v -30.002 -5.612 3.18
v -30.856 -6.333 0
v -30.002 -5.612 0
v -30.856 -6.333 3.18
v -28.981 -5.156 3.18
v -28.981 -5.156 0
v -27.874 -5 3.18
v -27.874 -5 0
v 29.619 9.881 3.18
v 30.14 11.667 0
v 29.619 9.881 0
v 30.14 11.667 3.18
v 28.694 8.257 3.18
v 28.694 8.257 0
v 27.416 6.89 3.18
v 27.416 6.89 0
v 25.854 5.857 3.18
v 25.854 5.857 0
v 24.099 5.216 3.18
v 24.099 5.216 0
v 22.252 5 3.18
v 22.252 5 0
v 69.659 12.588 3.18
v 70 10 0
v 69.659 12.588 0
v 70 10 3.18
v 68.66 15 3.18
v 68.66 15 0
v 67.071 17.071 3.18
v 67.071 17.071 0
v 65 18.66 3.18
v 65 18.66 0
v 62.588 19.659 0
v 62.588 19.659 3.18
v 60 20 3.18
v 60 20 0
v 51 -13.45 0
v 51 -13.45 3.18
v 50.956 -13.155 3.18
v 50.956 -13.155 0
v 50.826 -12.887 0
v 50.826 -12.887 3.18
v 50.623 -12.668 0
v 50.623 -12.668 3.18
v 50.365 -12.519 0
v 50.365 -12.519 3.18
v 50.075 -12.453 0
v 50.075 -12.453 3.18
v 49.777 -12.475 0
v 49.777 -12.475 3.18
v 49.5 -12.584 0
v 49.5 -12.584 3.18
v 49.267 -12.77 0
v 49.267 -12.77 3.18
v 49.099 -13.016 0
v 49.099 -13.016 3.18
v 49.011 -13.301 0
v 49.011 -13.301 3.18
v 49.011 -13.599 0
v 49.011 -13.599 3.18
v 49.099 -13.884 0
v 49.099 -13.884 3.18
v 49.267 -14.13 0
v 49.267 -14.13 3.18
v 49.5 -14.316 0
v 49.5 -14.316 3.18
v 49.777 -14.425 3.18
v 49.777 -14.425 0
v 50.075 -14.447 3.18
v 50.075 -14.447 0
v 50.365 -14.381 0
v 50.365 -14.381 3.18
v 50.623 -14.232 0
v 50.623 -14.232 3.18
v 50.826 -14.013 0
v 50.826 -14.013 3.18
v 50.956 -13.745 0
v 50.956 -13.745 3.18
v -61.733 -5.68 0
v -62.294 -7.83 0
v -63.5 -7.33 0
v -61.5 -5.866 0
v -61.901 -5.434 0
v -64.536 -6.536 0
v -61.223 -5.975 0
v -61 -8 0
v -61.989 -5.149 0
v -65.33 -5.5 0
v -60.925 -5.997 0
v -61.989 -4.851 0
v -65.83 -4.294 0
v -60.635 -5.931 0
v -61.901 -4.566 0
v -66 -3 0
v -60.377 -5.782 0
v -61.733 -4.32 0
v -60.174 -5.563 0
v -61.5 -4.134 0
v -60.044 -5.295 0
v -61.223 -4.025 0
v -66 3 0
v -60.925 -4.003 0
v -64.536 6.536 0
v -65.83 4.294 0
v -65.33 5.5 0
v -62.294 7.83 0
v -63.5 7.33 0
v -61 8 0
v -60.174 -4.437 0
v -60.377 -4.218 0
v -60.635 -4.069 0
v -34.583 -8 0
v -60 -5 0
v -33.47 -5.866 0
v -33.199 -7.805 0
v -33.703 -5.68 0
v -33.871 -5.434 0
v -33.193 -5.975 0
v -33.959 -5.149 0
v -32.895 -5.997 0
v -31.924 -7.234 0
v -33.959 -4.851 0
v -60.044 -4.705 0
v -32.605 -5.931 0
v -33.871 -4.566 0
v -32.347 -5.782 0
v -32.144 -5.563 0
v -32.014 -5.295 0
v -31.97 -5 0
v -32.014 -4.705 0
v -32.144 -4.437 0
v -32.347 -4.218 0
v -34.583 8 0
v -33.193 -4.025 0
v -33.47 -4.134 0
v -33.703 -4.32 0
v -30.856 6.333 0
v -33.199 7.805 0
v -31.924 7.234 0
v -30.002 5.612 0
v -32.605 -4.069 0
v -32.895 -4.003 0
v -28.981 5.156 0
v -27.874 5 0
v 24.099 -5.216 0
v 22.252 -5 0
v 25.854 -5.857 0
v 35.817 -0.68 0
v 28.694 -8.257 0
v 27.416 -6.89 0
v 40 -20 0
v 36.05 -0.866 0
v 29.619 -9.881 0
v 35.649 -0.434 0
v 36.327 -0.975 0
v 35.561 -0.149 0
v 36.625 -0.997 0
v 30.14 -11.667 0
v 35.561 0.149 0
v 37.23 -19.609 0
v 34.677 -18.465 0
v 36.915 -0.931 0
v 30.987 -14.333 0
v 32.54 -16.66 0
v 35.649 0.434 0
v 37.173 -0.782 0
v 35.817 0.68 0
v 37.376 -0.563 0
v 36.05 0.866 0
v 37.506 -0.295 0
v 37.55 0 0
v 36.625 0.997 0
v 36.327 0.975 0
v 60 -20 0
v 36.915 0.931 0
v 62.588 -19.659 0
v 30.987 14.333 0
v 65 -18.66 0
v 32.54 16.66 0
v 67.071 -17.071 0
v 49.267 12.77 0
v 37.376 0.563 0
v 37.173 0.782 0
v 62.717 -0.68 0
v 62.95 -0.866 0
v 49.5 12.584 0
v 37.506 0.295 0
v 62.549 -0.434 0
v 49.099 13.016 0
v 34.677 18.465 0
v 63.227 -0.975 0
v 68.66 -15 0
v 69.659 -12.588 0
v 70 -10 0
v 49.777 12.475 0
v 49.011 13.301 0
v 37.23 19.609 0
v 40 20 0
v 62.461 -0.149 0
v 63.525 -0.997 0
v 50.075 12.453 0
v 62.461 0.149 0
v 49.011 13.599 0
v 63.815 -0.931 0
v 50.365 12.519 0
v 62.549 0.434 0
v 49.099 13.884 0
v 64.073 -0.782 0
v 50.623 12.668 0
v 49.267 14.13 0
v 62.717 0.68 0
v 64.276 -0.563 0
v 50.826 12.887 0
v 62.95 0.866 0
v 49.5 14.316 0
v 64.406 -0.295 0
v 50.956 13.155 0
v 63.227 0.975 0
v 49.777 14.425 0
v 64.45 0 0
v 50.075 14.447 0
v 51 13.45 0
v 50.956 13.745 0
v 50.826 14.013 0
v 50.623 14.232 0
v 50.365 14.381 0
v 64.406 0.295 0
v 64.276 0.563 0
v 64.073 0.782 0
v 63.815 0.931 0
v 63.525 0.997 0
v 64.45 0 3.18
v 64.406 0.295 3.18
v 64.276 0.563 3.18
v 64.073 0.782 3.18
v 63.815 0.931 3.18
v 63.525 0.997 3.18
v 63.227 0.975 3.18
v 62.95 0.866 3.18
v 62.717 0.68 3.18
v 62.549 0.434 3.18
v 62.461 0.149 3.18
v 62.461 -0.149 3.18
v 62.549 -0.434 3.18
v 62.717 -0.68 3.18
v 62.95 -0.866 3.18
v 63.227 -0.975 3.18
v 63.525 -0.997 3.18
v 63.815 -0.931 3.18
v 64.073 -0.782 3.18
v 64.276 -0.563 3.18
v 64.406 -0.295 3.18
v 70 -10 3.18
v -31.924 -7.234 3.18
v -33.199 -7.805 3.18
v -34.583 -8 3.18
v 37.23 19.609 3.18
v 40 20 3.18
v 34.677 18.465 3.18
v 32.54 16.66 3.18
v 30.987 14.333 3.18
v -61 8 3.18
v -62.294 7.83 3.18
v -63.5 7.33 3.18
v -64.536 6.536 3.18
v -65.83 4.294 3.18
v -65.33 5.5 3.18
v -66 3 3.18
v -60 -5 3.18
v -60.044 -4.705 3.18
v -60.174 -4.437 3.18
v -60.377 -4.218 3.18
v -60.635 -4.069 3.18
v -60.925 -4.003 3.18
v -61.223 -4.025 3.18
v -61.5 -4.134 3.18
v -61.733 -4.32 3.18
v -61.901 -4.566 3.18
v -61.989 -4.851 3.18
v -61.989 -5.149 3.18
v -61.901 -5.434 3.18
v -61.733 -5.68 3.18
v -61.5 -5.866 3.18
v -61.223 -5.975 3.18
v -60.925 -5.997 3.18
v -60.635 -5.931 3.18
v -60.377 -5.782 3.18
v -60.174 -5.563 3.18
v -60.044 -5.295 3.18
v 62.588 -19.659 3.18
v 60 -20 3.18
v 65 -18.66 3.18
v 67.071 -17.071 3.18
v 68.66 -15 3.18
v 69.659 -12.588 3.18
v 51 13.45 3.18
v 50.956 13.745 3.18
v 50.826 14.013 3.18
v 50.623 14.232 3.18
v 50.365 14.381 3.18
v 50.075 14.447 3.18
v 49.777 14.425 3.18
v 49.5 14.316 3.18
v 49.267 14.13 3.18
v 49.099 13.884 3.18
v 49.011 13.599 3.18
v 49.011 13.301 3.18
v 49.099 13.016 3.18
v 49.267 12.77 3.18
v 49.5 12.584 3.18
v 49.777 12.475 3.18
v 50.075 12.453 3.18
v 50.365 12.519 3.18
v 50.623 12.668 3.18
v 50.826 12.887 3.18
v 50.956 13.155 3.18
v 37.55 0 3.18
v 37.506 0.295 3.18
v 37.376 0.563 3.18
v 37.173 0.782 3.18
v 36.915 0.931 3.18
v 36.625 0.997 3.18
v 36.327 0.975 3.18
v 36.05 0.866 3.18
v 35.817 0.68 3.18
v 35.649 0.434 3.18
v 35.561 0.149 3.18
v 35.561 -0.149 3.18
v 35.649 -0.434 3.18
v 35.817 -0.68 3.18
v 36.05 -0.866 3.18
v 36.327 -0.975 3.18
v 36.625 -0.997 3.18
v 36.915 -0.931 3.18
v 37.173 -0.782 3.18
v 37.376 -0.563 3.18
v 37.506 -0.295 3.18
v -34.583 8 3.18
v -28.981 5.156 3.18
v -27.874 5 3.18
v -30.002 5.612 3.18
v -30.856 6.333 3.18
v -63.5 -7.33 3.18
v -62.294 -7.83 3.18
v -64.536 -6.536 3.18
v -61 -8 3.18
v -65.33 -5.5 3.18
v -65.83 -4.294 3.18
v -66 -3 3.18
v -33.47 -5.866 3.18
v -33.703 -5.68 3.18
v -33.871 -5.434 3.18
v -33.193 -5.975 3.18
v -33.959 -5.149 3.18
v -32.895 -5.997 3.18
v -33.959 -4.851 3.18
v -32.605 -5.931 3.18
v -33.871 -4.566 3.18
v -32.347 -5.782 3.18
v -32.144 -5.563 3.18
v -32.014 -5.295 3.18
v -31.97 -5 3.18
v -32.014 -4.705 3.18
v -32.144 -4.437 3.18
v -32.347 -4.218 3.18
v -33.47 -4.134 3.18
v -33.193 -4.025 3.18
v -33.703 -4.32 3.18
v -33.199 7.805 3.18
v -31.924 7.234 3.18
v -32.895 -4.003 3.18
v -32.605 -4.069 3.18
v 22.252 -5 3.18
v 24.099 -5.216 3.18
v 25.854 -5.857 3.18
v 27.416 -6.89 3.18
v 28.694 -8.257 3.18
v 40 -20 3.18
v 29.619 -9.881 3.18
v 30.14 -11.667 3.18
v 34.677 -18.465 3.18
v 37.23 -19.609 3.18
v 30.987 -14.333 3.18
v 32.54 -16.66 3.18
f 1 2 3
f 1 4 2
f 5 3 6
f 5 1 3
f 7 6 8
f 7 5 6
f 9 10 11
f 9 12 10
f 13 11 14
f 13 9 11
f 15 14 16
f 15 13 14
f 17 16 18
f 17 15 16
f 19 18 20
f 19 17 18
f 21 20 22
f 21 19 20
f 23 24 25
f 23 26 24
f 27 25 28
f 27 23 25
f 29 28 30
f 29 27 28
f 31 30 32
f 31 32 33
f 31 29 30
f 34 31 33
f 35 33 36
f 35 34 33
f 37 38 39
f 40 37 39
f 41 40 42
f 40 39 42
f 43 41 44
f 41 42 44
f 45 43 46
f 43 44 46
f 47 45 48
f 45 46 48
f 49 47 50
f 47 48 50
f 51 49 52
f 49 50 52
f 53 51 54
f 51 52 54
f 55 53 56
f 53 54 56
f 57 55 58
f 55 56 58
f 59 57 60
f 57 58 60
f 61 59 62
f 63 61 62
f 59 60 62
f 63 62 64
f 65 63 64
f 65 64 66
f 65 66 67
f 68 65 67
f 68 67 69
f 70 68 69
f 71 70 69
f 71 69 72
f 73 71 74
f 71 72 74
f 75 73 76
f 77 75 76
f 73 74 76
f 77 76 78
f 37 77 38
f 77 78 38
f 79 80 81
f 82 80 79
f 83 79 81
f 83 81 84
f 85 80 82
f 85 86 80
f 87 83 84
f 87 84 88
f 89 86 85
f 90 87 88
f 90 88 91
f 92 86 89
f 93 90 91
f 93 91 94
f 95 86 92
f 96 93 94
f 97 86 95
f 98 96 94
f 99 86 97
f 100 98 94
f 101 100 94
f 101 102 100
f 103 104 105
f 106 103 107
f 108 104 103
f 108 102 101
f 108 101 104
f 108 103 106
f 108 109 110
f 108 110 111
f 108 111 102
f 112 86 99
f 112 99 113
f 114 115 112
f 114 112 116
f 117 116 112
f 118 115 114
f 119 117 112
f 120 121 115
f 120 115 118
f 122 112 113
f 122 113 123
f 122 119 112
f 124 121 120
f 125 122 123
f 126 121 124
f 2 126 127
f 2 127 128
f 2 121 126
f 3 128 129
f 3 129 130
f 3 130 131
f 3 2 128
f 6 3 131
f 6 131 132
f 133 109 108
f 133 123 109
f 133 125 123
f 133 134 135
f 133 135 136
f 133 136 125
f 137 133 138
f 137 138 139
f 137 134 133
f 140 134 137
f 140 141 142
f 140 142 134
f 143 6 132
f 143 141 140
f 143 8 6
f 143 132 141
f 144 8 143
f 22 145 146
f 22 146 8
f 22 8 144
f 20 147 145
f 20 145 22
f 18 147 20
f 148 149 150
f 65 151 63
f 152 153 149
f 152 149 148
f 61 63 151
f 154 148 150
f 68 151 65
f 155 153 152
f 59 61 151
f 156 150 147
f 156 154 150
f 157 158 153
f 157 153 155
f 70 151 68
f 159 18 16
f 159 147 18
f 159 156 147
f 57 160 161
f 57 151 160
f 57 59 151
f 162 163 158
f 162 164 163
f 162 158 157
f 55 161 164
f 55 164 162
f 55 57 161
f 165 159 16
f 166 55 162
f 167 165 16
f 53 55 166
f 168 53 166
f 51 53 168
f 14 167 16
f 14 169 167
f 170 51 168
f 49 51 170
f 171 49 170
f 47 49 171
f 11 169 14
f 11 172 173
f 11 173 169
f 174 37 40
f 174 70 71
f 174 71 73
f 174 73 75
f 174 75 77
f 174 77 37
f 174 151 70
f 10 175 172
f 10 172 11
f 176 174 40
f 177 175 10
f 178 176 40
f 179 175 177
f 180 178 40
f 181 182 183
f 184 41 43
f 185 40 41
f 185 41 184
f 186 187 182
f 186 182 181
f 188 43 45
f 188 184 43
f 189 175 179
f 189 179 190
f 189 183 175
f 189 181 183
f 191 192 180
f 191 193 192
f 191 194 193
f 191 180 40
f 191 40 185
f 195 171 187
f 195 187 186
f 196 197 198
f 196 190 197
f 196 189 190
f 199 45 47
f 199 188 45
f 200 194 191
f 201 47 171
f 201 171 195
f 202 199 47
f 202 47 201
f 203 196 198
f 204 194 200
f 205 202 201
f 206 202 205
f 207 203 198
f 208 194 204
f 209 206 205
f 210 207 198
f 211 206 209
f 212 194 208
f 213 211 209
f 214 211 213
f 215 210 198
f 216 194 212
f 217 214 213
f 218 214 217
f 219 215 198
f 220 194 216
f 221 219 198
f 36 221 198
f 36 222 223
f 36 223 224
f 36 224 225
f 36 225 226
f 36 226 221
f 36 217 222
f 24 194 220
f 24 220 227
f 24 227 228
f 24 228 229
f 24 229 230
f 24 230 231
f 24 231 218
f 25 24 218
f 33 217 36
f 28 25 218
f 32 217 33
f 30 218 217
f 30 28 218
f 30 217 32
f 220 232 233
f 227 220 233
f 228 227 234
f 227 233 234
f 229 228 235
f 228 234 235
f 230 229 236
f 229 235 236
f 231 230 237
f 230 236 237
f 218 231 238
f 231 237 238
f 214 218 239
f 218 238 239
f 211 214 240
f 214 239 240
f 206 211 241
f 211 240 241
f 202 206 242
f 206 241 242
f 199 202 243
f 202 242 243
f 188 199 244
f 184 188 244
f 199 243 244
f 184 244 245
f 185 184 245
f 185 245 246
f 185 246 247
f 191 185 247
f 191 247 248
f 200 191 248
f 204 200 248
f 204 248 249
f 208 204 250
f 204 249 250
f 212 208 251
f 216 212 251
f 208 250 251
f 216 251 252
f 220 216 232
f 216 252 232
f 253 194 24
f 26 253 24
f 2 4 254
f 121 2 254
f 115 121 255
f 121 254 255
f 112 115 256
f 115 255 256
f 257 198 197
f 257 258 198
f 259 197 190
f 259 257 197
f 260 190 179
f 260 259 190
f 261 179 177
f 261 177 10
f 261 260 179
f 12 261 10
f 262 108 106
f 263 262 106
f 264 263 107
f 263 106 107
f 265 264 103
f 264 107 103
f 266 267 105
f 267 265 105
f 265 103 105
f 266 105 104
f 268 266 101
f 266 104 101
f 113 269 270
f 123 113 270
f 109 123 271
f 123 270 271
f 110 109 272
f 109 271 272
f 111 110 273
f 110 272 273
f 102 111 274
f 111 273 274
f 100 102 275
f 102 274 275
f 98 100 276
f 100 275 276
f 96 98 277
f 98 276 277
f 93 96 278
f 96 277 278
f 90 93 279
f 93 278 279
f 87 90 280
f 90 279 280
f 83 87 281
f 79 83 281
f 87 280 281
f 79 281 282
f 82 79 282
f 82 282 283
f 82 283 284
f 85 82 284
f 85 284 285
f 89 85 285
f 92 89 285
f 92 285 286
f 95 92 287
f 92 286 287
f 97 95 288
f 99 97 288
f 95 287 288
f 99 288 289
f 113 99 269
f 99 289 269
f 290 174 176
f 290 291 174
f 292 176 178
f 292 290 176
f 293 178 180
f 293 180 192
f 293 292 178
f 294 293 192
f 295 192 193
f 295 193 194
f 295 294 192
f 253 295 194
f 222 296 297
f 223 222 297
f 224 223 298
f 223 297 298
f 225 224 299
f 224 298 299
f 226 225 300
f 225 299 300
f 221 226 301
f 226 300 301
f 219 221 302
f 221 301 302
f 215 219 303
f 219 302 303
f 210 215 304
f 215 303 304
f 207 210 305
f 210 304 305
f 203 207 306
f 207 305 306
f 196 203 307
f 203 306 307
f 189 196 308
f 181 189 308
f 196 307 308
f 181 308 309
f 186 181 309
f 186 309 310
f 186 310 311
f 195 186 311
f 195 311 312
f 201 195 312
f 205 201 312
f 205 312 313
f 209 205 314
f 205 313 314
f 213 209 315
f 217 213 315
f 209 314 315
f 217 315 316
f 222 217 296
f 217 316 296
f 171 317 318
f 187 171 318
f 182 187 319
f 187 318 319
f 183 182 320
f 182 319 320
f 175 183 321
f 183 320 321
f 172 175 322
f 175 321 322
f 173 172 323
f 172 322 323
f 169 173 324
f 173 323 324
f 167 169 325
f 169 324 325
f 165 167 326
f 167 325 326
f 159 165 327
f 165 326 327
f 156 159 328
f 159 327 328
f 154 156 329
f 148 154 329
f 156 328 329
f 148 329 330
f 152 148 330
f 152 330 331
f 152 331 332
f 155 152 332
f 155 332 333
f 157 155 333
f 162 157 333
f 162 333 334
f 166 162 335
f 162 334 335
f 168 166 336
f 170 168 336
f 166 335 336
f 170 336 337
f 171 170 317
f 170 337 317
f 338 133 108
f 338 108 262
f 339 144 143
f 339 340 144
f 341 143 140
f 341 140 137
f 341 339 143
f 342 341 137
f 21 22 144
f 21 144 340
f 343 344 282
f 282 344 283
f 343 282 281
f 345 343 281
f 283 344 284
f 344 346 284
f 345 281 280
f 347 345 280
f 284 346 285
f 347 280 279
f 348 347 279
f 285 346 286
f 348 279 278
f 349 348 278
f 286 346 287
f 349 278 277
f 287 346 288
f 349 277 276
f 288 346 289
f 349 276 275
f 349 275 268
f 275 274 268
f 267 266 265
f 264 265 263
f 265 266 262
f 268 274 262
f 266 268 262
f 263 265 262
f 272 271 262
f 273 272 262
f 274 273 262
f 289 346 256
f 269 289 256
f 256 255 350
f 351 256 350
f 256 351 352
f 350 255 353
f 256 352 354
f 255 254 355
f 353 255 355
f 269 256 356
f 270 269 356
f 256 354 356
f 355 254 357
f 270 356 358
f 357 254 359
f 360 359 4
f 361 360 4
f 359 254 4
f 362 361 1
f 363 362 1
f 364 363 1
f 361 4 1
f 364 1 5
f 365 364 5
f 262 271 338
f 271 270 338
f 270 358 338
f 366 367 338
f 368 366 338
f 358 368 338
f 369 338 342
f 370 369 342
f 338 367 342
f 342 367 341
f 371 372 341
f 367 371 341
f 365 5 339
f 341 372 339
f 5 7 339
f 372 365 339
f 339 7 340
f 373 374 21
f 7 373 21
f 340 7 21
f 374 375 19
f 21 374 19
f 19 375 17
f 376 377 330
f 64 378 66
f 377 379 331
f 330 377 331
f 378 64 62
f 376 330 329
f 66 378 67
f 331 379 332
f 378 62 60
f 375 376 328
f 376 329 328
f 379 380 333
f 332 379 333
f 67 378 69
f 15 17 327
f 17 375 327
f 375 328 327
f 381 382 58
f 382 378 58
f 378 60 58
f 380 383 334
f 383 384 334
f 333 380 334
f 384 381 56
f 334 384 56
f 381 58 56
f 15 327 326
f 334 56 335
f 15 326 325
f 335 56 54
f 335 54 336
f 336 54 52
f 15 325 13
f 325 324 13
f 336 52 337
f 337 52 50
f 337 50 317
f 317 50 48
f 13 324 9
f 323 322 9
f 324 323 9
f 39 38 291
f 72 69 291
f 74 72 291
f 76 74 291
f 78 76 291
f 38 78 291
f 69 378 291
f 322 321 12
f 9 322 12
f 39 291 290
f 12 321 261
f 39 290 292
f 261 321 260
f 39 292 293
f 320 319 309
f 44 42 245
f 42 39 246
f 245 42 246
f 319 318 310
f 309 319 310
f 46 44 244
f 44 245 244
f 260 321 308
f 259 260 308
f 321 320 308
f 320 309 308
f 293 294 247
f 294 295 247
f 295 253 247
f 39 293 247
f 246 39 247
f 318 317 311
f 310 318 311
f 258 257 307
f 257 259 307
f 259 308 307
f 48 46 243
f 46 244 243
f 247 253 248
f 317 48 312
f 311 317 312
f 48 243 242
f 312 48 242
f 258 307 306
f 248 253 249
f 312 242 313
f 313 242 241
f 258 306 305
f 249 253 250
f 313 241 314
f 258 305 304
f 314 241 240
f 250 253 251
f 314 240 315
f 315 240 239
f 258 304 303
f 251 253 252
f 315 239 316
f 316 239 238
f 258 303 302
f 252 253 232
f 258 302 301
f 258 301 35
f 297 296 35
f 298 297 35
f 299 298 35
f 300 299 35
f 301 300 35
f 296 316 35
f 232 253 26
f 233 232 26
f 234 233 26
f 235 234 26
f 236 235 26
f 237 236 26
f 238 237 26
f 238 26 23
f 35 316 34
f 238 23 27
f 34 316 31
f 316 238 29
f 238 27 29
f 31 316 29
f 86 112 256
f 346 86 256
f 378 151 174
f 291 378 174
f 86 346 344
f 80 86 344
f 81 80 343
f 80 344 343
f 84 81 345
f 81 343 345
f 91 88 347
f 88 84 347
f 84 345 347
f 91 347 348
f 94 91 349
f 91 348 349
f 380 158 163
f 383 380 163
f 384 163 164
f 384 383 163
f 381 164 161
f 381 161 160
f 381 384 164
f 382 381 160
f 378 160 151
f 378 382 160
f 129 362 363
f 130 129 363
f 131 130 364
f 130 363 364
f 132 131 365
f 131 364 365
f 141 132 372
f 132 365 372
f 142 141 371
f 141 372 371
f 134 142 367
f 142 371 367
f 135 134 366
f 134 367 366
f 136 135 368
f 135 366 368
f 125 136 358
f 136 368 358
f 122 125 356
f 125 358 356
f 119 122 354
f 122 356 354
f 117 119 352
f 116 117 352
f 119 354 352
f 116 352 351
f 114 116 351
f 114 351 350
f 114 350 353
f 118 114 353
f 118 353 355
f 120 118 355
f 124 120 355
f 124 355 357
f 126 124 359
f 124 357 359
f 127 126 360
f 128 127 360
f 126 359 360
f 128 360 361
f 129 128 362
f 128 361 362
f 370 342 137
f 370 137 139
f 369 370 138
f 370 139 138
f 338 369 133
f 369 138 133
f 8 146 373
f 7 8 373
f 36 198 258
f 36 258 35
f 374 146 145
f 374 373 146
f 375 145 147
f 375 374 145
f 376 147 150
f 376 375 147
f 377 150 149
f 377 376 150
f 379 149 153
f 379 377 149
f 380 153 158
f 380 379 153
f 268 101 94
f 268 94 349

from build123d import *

# Parameters (mm, degrees)
SKETCH1_W           = 40
SKETCH1_H           = 40
BOSS_EXTRUDE1_DEPTH = 3.18
SKETCH2_W           = 3.18
SKETCH2_H           = 10
BOSS_EXTRUDE2_DEPTH = 60
SKETCH3_W           = 3.18
SKETCH3_H           = 16
BOSS_EXTRUDE3_DEPTH = 36
FILLET1_R           = 10
FILLET2_R           = 8
FILLET3_R           = 5
FILLET4_R           = 4
SKETCH7_R           = 1
CUT_EXTRUDE2_DEPTH  = 3.18
SKETCH8_R           = 1
CUT_EXTRUDE3_DEPTH  = 3.18


with BuildPart() as part:
    # Sketch1 → Boss-Extrude1 (new body)
    with BuildSketch(Plane.XY):
        with Locations((50, 0)):
            Rectangle(SKETCH1_W, SKETCH1_H)
    extrude(amount=BOSS_EXTRUDE1_DEPTH)

    # Sketch2 → Boss-Extrude2 (add)
    with BuildSketch(Plane.ZY.offset(-30)):
        with Locations((1.59, 0)):
            Rectangle(SKETCH2_W, SKETCH2_H)
    extrude(amount=BOSS_EXTRUDE2_DEPTH)

    # Sketch3 → Boss-Extrude3 (add)
    with BuildSketch(Plane.ZY.offset(30)):
        with Locations((1.59, 0)):
            Rectangle(SKETCH3_W, SKETCH3_H)
    extrude(amount=BOSS_EXTRUDE3_DEPTH)

    # Fillet1
    fillet1_edges = [part.edges().sort_by_distance(p)[0] for p in [
        (70, -20, 1.59),
        (30, -20, 1.59),
        (30, 20, 1.59),
        (70, 20, 1.59),
    ]]
    fillet(fillet1_edges, radius=FILLET1_R)

    # Fillet2
    fillet2_edges = [part.edges().sort_by_distance(p)[0] for p in [
        (30, 5, 1.59),
        (30, -5, 1.59),
    ]]
    fillet(fillet2_edges, radius=FILLET2_R)

    # Fillet3
    # the kernel refuses this fillet: 5 mm, written as the material it takes off along each edge
    with BuildSketch(Plane(origin=(-30, 8, -11.456439237), x_dir=(-1, 0, 0), z_dir=(0, 0, 1))) as fillet3_piece_1:
        with BuildLine():
            CenterArc((4.582575695, 5), FILLET3_R, 203.578178478, 66.421821522)
            Line((0, 3), (-0.091651514, 2.96))
            ThreePointArc((-0.091651514, 2.96), (-0.1, 1.5), (-0.1, 0))
            Line((-0.1, 0), (0, -0.1))
            Line((0, -0.1), (4.582575695, -0.1))
            Line((4.582575695, -0.1), (4.582575695, 0))
        make_face()
    extrude(amount=26.092878475, mode=Mode.SUBTRACT)
    with BuildSketch(Plane(origin=(-66, 8, -12.5), x_dir=(0, -1, 0), z_dir=(0, 0, 1))) as fillet3_piece_2:
        with BuildLine():
            CenterArc((FILLET3_R, FILLET3_R), FILLET3_R, 180, 90)
            Line((0, FILLET3_R), (-FILLET3_R * 0.02, FILLET3_R))
            Line((-FILLET3_R * 0.02, FILLET3_R), (-FILLET3_R * 0.02, -FILLET3_R * 0.02))
            Line((-FILLET3_R * 0.02, -FILLET3_R * 0.02), (FILLET3_R, -FILLET3_R * 0.02))
            Line((FILLET3_R, -FILLET3_R * 0.02), (FILLET3_R, 0))
        make_face()
    extrude(amount=28.18, mode=Mode.SUBTRACT)
    with BuildSketch(Plane(origin=(-66, -8, 15.68), x_dir=(1, 0, 0), z_dir=(0, 0, -1))) as fillet3_piece_3:
        with BuildLine():
            CenterArc((FILLET3_R, -FILLET3_R), FILLET3_R, 90, 90)
            Line((0, -FILLET3_R), (-FILLET3_R * 0.02, -FILLET3_R))
            Line((-FILLET3_R * 0.02, -FILLET3_R), (-FILLET3_R * 0.02, FILLET3_R * 0.02))
            Line((-FILLET3_R * 0.02, FILLET3_R * 0.02), (FILLET3_R, FILLET3_R * 0.02))
            Line((FILLET3_R, FILLET3_R * 0.02), (FILLET3_R, 0))
        make_face()
    extrude(amount=28.18, mode=Mode.SUBTRACT)
    with BuildSketch(Plane(origin=(-30, -8, 14.636439237), x_dir=(0, 1, 0), z_dir=(0, 0, -1))) as fillet3_piece_4:
        with BuildLine():
            CenterArc((5, -4.582575695), FILLET3_R, 113.578178478, 66.421821522)
            Line((0, -4.582575695), (-0.1, -4.582575695))
            Line((-0.1, -4.582575695), (-0.1, 0))
            Line((-0.1, 0), (0, 0.1))
            ThreePointArc((0, 0.1), (1.5, 0.1), (2.96, 0.091651514))
            Line((2.96, 0.091651514), (3, 0))
        make_face()
    extrude(amount=26.092878475, mode=Mode.SUBTRACT)

    # Fillet4
    fillet4_edges = [part.edges().sort_by_distance(p)[0] for p in [
        (-30, -5, 1.59),
        (-30, 5, 1.59),
    ]]
    fillet(fillet4_edges, radius=FILLET4_R)

    # Sketch7 → Cut-Extrude2 (cut)
    with BuildSketch(Plane.XY.offset(3.18)):
        with Locations((63.45, 0)):
            Circle(SKETCH7_R)
        with Locations((36.55, 0)):
            Circle(SKETCH7_R)
        with Locations((50, 13.45)):
            Circle(SKETCH7_R)
        with Locations((50, -13.45)):
            Circle(SKETCH7_R)
    extrude(amount=-CUT_EXTRUDE2_DEPTH, mode=Mode.SUBTRACT)

    # Sketch8 → Cut-Extrude3 (cut)
    with BuildSketch(Plane.XY.offset(3.18)):
        with Locations((-32.97, -5)):
            Circle(SKETCH8_R)
        with Locations((-61, -5)):
            Circle(SKETCH8_R)
    extrude(amount=-CUT_EXTRUDE3_DEPTH, mode=Mode.SUBTRACT)


solid = part.part
